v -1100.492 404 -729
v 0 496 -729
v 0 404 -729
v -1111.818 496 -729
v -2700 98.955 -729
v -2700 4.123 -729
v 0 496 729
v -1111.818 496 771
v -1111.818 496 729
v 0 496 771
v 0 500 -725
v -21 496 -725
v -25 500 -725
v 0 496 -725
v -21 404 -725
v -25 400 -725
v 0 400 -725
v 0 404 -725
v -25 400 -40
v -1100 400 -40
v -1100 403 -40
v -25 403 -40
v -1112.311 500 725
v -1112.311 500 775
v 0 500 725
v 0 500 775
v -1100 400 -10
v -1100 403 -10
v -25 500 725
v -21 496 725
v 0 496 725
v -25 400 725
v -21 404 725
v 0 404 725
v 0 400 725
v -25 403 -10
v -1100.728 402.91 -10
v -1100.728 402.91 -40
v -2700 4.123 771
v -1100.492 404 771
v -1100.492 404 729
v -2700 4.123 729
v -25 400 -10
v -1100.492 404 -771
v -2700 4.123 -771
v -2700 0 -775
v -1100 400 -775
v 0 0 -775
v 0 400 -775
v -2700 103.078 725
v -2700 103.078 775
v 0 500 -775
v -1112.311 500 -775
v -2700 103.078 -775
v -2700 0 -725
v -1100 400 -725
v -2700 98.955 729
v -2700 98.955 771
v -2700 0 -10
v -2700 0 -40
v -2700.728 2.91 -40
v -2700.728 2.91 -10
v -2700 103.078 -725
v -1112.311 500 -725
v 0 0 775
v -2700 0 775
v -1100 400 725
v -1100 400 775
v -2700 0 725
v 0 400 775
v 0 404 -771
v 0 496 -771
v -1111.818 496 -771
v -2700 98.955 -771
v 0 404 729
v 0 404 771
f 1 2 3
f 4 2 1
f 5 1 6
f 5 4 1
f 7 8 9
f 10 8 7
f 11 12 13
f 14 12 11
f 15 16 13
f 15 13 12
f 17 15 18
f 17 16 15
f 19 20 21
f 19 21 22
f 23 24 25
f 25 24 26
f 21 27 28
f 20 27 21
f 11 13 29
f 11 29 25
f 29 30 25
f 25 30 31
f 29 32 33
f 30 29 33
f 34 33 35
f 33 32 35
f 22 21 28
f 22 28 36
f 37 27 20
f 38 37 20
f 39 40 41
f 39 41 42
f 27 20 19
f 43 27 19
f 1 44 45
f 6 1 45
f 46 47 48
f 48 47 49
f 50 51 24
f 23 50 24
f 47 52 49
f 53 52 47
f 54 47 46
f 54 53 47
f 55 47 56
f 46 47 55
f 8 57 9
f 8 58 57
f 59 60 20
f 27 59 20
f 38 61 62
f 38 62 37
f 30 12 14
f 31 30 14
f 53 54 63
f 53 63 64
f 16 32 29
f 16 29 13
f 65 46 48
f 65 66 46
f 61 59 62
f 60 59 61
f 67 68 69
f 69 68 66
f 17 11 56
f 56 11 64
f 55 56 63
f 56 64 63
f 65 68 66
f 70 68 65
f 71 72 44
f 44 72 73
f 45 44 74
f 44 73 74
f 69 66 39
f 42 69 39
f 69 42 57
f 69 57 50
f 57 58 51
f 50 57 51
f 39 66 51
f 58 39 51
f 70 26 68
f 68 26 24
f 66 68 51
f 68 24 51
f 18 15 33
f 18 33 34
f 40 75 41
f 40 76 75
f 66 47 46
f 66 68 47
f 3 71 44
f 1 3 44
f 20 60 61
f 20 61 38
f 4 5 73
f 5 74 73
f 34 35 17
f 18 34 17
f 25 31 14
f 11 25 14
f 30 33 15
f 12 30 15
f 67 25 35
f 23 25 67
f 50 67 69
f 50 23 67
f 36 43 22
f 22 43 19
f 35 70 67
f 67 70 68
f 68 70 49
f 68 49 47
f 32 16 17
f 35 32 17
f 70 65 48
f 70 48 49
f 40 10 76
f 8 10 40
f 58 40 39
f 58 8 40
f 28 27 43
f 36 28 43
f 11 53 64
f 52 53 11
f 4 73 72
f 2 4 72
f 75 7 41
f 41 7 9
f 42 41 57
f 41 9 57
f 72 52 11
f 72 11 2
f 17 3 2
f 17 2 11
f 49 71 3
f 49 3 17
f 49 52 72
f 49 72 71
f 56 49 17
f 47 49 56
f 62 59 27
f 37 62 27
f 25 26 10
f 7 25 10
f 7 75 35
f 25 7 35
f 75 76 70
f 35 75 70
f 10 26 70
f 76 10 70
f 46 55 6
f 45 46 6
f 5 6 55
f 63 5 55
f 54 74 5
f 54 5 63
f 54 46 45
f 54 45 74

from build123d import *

# Parameters (mm, degrees)
BOSS_EXTRUDE1_DEPTH      = 775
BOSS_EXTRUDE1_DEPTH_BACK = 775
BOSS_EXTRUDE2_DEPTH      = 50
SHELL1_T                 = -4
BOSS_EXTRUDE3_DEPTH      = 50
SHELL2_T                 = -4
SKETCH5_W                = 25
SKETCH5_H                = 1450
BOSS_EXTRUDE4_DEPTH      = 100
SHELL3_T                 = -4
SKETCH7_W                = 1075
SKETCH7_H                = 30
BOSS_EXTRUDE5_DEPTH      = 3
SKETCH8_W                = 1649.242250247
SKETCH8_H                = 30
BOSS_EXTRUDE6_DEPTH      = 3


with BuildPart() as part:
    # Sketch1 → Boss-Extrude1 (new, two sides: drawn at the far end of the back side and taken through both)
    with BuildSketch(Plane.XY.offset(-BOSS_EXTRUDE1_DEPTH_BACK)):
        Polygon((-2700, 0), (0, 0), (0, 400), (-1100, 400), align=None)
    extrude(amount=BOSS_EXTRUDE1_DEPTH + BOSS_EXTRUDE1_DEPTH_BACK)


with BuildPart() as body_2:
    # Sketch3 → Boss-Extrude2 (new body)
    with BuildSketch(Plane.XY.offset(775)):
        Polygon((-2700, 103.07764064), (-2700, 0), (-1100, 400), (0, 400), (0, 500), (-1112.310562562, 500), align=None)
    extrude(amount=-BOSS_EXTRUDE2_DEPTH)

    # Shell1
    shell1_openings = [body_2.faces().sort_by_distance(p)[0] for p in [
        (0, 450, 750),
        (-2700, 51.53882032, 750),
    ]]
    offset(amount=SHELL1_T, openings=shell1_openings, kind=Kind.INTERSECTION)


with BuildPart() as body_3:
    # Sketch4 → Boss-Extrude3 (new body)
    with BuildSketch(Plane(origin=(0, 0, -775), x_dir=(-1, 0, 0), z_dir=(0, 0, -1))):
        Polygon((2700, 0), (2700, 103.07764064), (1112.310562562, 500), (0, 500), (0, 400), (1100, 400), align=None)
    extrude(amount=-BOSS_EXTRUDE3_DEPTH)

    # Shell2
    shell2_openings = [body_3.faces().sort_by_distance(p)[0] for p in [
        (0, 450, -750),
        (-2700, 51.53882032, -750),
    ]]
    offset(amount=SHELL2_T, openings=shell2_openings, kind=Kind.INTERSECTION)


with BuildPart() as body_4:
    # Sketch5 → Boss-Extrude4 (new body)
    with BuildSketch(Plane(origin=(0, 400, 0), x_dir=(1, 0, 0), z_dir=(0, 1, 0))):
        with Locations((-12.5, 0)):
            Rectangle(SKETCH5_W, SKETCH5_H)
    extrude(amount=BOSS_EXTRUDE4_DEPTH)

    # Shell3
    shell3_openings = [body_4.faces().sort_by_distance(p)[0] for p in [
        (-12.5, 450, -725),
        (0, 450, 0),
        (-12.5, 450, 725),
    ]]
    offset(amount=SHELL3_T, openings=shell3_openings, kind=Kind.INTERSECTION)


with BuildPart() as body_5:
    # Sketch7 → Boss-Extrude5 (new body)
    with BuildSketch(Plane(origin=(0, 400, 0), x_dir=(1, 0, 0), z_dir=(0, 1, 0))):
        with Locations((-562.5, 25)):
            Rectangle(SKETCH7_W, SKETCH7_H)
    extrude(amount=BOSS_EXTRUDE5_DEPTH)


with BuildPart() as body_6:
    # Sketch8 → Boss-Extrude6 (new body)
    with BuildSketch(Plane(origin=(-158.823529412, 635.294117647, 0), x_dir=(0.970142500145332, 0.24253562503633297, 0), z_dir=(-0.24253562503633297, 0.970142500145332, 0))):
        with Locations((-1794.763625269, 25)):
            Rectangle(SKETCH8_W, SKETCH8_H)
    extrude(amount=BOSS_EXTRUDE6_DEPTH)


solid = Compound([part.part, body_2.part, body_3.part, body_4.part, body_5.part, body_6.part])
